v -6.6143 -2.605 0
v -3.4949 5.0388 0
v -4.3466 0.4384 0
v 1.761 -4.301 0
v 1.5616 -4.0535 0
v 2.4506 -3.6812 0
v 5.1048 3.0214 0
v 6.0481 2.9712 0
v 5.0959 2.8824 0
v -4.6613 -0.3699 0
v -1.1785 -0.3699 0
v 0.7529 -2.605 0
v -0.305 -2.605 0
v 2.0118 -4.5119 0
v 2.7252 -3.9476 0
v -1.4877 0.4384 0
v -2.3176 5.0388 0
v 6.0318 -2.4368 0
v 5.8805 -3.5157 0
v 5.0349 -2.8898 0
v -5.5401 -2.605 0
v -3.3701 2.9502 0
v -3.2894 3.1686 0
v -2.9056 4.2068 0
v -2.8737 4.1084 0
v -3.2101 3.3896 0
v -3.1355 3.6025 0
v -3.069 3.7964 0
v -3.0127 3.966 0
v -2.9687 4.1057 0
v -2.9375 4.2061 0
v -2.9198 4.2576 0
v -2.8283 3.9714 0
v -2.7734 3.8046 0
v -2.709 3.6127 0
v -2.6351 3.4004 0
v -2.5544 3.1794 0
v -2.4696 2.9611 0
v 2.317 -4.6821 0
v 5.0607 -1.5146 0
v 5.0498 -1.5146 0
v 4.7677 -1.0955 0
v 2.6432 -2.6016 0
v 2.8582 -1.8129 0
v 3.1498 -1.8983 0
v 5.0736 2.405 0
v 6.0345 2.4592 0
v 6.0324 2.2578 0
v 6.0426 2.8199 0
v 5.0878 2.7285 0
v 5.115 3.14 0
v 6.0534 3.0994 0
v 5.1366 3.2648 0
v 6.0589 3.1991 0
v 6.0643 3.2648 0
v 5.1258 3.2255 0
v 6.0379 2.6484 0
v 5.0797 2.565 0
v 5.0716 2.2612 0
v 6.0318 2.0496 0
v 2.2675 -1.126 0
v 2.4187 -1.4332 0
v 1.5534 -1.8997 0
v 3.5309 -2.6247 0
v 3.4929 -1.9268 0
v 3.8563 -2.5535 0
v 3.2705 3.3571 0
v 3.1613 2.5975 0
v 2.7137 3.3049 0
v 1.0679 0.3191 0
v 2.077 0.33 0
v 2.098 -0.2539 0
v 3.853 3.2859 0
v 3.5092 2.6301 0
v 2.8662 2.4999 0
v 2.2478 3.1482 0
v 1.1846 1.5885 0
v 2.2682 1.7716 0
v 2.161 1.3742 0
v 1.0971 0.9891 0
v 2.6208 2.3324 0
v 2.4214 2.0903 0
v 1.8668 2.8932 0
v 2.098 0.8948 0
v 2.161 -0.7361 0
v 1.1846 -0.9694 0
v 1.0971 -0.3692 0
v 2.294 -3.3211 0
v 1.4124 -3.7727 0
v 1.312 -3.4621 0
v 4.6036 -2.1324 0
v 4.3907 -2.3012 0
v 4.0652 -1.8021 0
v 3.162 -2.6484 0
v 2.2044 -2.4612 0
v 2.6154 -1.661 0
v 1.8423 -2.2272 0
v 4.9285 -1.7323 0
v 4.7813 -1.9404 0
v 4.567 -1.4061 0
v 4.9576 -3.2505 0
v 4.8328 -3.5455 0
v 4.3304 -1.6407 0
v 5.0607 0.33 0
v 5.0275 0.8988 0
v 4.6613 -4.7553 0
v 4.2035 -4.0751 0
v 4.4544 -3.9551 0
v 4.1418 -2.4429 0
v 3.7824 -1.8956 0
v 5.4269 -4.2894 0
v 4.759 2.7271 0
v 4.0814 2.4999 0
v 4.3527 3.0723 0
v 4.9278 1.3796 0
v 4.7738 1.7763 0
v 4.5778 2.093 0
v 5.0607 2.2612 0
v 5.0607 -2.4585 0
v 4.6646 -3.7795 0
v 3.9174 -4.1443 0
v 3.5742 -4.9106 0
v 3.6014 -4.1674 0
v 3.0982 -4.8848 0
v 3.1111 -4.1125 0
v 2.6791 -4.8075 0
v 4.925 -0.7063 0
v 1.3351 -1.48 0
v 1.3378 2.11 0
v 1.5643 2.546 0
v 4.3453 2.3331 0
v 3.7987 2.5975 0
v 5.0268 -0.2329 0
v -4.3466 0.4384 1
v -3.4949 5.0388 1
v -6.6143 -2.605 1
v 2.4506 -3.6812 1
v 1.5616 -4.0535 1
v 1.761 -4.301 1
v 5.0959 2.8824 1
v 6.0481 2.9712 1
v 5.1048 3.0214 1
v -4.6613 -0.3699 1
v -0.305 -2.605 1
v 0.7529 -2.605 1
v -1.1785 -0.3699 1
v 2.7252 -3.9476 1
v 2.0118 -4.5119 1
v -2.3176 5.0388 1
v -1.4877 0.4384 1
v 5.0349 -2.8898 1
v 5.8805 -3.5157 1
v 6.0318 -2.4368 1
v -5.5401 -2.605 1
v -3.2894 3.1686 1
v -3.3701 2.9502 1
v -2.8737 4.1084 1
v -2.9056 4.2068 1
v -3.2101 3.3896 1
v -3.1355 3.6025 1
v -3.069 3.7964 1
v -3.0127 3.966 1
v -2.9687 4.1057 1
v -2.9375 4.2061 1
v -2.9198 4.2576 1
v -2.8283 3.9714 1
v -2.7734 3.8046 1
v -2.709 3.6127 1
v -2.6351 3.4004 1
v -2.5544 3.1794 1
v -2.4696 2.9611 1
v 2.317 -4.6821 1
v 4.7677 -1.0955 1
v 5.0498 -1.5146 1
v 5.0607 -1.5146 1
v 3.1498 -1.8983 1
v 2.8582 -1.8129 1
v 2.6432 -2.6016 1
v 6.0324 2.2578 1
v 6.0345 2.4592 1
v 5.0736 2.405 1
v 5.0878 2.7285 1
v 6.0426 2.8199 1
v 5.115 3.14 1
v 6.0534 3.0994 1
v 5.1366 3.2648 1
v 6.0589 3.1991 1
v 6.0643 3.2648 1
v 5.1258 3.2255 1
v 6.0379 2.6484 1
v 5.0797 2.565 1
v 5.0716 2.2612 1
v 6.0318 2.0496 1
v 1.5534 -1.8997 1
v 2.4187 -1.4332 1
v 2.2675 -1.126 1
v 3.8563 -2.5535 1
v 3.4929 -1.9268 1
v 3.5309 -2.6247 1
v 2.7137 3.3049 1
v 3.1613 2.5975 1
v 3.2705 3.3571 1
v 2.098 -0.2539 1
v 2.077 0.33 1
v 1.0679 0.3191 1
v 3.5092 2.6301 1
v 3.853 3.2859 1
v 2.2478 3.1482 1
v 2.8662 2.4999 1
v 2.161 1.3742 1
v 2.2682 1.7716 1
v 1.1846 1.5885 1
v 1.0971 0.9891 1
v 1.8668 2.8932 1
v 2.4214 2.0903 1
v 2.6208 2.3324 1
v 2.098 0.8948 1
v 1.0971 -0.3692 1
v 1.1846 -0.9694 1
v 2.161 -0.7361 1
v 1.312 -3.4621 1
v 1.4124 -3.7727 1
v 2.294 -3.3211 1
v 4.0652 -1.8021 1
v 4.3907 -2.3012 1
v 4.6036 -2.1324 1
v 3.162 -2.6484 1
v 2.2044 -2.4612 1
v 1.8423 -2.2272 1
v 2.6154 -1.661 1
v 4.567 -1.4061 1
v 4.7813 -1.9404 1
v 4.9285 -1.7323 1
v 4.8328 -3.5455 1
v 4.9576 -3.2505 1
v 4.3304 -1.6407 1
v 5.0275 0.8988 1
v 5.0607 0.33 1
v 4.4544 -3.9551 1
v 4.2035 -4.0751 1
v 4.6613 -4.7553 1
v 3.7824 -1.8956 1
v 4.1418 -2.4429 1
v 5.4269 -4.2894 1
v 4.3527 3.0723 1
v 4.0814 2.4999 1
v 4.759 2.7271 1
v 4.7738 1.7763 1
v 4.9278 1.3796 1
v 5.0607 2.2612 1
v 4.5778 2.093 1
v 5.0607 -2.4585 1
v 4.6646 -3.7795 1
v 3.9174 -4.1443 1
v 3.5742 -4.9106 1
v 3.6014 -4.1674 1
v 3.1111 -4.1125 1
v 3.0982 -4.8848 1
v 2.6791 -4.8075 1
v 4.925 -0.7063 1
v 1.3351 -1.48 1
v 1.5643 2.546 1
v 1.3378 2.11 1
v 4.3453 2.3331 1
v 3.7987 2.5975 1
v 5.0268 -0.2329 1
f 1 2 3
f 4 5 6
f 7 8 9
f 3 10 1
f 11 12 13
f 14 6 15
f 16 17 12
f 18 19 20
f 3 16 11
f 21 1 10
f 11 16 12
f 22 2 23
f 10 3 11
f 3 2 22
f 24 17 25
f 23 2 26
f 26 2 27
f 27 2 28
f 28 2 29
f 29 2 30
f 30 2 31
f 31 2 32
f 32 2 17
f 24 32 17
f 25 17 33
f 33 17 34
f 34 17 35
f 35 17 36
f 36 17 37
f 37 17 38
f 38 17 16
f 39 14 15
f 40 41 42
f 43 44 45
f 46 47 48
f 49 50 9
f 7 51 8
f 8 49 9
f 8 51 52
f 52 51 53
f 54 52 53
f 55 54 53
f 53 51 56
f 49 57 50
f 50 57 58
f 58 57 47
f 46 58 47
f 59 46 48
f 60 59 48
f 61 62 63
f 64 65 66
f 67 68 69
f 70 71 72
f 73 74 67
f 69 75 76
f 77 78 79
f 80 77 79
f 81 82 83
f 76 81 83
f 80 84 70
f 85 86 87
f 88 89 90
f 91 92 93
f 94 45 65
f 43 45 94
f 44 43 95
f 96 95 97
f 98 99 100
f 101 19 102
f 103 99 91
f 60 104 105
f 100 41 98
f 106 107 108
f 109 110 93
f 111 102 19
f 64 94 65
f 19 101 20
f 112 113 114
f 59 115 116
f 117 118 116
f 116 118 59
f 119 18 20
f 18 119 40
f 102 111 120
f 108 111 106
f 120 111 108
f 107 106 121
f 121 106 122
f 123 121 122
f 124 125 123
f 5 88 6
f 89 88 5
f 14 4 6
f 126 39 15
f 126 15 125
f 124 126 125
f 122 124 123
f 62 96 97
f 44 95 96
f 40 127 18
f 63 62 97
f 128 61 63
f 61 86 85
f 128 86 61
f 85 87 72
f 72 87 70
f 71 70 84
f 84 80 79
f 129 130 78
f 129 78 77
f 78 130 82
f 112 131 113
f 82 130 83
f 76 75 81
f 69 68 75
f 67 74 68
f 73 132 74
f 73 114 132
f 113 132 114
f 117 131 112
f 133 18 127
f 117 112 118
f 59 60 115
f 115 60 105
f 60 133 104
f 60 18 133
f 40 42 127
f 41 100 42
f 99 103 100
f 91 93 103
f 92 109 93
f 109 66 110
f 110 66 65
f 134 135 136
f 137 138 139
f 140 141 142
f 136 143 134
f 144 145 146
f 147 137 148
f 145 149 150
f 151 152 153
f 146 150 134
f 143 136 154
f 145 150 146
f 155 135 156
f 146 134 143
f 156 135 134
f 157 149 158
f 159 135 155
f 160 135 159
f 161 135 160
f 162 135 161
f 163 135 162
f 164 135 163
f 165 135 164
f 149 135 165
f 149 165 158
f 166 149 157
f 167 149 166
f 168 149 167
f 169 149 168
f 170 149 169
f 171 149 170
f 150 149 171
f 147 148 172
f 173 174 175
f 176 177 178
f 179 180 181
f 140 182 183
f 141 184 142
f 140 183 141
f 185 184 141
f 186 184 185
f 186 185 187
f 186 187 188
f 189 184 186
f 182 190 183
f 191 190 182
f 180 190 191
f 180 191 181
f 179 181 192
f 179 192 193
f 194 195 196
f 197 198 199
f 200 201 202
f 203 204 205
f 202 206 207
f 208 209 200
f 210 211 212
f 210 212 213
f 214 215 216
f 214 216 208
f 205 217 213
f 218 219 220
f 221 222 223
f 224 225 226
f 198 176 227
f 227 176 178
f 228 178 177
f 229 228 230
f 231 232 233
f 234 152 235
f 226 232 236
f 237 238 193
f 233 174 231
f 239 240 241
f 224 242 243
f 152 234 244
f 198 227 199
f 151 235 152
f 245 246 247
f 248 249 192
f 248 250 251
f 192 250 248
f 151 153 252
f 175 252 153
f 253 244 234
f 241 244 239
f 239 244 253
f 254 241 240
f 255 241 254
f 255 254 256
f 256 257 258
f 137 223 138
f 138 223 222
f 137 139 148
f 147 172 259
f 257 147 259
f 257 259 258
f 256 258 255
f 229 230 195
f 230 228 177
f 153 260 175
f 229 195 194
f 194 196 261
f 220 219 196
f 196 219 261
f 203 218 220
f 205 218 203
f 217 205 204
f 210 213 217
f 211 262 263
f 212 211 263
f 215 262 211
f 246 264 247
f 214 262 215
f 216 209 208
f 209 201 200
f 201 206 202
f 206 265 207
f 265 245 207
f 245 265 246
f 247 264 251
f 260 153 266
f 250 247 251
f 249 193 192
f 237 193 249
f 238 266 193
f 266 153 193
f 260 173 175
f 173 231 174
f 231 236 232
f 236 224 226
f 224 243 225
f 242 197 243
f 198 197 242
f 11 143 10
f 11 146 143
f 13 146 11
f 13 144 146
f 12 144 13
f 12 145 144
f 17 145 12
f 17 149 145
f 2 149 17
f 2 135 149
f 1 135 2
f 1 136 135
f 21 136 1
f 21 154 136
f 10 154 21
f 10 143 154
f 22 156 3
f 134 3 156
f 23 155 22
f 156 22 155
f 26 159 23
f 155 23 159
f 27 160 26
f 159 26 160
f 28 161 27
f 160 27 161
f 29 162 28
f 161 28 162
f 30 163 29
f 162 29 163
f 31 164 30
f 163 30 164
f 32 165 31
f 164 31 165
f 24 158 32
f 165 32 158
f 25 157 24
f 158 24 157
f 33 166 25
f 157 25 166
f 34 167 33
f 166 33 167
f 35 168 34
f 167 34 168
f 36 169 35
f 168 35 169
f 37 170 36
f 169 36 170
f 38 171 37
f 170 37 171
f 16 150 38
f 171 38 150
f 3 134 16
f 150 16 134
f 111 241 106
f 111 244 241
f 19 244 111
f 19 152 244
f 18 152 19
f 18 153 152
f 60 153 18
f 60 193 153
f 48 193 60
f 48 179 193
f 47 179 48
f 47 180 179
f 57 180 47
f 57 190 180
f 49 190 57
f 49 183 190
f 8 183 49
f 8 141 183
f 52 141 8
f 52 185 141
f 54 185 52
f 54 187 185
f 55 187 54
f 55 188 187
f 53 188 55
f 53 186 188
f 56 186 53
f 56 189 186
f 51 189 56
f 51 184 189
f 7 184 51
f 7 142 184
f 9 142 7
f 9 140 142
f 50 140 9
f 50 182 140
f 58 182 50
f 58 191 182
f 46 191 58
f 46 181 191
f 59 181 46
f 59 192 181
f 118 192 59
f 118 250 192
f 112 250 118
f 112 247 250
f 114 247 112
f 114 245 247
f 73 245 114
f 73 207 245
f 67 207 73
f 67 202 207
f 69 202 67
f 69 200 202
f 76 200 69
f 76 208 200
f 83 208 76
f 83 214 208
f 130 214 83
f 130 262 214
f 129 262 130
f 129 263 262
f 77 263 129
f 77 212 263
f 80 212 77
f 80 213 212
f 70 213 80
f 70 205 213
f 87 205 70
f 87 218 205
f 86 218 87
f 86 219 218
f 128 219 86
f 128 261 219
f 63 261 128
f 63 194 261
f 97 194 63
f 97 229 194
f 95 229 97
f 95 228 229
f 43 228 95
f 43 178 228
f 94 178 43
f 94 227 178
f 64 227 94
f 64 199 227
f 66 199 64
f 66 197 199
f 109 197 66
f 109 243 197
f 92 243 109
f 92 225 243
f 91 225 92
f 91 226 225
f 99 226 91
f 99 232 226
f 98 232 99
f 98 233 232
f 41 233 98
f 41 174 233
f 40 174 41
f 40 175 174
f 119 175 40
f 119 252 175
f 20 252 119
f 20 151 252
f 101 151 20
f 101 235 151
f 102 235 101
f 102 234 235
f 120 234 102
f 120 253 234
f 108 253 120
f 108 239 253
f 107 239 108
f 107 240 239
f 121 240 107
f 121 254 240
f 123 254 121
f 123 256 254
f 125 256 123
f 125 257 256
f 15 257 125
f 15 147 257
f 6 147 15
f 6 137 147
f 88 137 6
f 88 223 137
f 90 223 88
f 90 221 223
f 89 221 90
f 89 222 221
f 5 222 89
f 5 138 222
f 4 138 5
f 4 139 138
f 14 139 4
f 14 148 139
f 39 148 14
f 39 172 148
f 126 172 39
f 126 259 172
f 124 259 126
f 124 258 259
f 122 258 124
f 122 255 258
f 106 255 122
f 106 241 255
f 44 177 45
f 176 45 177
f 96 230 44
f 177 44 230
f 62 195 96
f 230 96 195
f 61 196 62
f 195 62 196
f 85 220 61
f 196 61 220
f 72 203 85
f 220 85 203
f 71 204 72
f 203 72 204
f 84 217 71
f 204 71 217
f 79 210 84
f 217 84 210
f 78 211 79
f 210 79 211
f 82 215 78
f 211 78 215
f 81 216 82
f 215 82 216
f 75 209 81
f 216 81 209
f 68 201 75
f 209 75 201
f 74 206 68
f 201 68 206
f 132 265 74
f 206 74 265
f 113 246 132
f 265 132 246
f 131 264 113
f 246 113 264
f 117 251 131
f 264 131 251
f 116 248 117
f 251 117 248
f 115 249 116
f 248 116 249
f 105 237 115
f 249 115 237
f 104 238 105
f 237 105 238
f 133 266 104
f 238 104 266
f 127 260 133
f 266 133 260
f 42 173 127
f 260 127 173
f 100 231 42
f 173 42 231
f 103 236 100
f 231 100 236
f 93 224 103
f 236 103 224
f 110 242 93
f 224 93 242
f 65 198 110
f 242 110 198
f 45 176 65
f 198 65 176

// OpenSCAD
// centered text with few fragments
linear_extrude(1) text("Ag", size = 8, halign = "center", valign = "center", $fn = 8);
